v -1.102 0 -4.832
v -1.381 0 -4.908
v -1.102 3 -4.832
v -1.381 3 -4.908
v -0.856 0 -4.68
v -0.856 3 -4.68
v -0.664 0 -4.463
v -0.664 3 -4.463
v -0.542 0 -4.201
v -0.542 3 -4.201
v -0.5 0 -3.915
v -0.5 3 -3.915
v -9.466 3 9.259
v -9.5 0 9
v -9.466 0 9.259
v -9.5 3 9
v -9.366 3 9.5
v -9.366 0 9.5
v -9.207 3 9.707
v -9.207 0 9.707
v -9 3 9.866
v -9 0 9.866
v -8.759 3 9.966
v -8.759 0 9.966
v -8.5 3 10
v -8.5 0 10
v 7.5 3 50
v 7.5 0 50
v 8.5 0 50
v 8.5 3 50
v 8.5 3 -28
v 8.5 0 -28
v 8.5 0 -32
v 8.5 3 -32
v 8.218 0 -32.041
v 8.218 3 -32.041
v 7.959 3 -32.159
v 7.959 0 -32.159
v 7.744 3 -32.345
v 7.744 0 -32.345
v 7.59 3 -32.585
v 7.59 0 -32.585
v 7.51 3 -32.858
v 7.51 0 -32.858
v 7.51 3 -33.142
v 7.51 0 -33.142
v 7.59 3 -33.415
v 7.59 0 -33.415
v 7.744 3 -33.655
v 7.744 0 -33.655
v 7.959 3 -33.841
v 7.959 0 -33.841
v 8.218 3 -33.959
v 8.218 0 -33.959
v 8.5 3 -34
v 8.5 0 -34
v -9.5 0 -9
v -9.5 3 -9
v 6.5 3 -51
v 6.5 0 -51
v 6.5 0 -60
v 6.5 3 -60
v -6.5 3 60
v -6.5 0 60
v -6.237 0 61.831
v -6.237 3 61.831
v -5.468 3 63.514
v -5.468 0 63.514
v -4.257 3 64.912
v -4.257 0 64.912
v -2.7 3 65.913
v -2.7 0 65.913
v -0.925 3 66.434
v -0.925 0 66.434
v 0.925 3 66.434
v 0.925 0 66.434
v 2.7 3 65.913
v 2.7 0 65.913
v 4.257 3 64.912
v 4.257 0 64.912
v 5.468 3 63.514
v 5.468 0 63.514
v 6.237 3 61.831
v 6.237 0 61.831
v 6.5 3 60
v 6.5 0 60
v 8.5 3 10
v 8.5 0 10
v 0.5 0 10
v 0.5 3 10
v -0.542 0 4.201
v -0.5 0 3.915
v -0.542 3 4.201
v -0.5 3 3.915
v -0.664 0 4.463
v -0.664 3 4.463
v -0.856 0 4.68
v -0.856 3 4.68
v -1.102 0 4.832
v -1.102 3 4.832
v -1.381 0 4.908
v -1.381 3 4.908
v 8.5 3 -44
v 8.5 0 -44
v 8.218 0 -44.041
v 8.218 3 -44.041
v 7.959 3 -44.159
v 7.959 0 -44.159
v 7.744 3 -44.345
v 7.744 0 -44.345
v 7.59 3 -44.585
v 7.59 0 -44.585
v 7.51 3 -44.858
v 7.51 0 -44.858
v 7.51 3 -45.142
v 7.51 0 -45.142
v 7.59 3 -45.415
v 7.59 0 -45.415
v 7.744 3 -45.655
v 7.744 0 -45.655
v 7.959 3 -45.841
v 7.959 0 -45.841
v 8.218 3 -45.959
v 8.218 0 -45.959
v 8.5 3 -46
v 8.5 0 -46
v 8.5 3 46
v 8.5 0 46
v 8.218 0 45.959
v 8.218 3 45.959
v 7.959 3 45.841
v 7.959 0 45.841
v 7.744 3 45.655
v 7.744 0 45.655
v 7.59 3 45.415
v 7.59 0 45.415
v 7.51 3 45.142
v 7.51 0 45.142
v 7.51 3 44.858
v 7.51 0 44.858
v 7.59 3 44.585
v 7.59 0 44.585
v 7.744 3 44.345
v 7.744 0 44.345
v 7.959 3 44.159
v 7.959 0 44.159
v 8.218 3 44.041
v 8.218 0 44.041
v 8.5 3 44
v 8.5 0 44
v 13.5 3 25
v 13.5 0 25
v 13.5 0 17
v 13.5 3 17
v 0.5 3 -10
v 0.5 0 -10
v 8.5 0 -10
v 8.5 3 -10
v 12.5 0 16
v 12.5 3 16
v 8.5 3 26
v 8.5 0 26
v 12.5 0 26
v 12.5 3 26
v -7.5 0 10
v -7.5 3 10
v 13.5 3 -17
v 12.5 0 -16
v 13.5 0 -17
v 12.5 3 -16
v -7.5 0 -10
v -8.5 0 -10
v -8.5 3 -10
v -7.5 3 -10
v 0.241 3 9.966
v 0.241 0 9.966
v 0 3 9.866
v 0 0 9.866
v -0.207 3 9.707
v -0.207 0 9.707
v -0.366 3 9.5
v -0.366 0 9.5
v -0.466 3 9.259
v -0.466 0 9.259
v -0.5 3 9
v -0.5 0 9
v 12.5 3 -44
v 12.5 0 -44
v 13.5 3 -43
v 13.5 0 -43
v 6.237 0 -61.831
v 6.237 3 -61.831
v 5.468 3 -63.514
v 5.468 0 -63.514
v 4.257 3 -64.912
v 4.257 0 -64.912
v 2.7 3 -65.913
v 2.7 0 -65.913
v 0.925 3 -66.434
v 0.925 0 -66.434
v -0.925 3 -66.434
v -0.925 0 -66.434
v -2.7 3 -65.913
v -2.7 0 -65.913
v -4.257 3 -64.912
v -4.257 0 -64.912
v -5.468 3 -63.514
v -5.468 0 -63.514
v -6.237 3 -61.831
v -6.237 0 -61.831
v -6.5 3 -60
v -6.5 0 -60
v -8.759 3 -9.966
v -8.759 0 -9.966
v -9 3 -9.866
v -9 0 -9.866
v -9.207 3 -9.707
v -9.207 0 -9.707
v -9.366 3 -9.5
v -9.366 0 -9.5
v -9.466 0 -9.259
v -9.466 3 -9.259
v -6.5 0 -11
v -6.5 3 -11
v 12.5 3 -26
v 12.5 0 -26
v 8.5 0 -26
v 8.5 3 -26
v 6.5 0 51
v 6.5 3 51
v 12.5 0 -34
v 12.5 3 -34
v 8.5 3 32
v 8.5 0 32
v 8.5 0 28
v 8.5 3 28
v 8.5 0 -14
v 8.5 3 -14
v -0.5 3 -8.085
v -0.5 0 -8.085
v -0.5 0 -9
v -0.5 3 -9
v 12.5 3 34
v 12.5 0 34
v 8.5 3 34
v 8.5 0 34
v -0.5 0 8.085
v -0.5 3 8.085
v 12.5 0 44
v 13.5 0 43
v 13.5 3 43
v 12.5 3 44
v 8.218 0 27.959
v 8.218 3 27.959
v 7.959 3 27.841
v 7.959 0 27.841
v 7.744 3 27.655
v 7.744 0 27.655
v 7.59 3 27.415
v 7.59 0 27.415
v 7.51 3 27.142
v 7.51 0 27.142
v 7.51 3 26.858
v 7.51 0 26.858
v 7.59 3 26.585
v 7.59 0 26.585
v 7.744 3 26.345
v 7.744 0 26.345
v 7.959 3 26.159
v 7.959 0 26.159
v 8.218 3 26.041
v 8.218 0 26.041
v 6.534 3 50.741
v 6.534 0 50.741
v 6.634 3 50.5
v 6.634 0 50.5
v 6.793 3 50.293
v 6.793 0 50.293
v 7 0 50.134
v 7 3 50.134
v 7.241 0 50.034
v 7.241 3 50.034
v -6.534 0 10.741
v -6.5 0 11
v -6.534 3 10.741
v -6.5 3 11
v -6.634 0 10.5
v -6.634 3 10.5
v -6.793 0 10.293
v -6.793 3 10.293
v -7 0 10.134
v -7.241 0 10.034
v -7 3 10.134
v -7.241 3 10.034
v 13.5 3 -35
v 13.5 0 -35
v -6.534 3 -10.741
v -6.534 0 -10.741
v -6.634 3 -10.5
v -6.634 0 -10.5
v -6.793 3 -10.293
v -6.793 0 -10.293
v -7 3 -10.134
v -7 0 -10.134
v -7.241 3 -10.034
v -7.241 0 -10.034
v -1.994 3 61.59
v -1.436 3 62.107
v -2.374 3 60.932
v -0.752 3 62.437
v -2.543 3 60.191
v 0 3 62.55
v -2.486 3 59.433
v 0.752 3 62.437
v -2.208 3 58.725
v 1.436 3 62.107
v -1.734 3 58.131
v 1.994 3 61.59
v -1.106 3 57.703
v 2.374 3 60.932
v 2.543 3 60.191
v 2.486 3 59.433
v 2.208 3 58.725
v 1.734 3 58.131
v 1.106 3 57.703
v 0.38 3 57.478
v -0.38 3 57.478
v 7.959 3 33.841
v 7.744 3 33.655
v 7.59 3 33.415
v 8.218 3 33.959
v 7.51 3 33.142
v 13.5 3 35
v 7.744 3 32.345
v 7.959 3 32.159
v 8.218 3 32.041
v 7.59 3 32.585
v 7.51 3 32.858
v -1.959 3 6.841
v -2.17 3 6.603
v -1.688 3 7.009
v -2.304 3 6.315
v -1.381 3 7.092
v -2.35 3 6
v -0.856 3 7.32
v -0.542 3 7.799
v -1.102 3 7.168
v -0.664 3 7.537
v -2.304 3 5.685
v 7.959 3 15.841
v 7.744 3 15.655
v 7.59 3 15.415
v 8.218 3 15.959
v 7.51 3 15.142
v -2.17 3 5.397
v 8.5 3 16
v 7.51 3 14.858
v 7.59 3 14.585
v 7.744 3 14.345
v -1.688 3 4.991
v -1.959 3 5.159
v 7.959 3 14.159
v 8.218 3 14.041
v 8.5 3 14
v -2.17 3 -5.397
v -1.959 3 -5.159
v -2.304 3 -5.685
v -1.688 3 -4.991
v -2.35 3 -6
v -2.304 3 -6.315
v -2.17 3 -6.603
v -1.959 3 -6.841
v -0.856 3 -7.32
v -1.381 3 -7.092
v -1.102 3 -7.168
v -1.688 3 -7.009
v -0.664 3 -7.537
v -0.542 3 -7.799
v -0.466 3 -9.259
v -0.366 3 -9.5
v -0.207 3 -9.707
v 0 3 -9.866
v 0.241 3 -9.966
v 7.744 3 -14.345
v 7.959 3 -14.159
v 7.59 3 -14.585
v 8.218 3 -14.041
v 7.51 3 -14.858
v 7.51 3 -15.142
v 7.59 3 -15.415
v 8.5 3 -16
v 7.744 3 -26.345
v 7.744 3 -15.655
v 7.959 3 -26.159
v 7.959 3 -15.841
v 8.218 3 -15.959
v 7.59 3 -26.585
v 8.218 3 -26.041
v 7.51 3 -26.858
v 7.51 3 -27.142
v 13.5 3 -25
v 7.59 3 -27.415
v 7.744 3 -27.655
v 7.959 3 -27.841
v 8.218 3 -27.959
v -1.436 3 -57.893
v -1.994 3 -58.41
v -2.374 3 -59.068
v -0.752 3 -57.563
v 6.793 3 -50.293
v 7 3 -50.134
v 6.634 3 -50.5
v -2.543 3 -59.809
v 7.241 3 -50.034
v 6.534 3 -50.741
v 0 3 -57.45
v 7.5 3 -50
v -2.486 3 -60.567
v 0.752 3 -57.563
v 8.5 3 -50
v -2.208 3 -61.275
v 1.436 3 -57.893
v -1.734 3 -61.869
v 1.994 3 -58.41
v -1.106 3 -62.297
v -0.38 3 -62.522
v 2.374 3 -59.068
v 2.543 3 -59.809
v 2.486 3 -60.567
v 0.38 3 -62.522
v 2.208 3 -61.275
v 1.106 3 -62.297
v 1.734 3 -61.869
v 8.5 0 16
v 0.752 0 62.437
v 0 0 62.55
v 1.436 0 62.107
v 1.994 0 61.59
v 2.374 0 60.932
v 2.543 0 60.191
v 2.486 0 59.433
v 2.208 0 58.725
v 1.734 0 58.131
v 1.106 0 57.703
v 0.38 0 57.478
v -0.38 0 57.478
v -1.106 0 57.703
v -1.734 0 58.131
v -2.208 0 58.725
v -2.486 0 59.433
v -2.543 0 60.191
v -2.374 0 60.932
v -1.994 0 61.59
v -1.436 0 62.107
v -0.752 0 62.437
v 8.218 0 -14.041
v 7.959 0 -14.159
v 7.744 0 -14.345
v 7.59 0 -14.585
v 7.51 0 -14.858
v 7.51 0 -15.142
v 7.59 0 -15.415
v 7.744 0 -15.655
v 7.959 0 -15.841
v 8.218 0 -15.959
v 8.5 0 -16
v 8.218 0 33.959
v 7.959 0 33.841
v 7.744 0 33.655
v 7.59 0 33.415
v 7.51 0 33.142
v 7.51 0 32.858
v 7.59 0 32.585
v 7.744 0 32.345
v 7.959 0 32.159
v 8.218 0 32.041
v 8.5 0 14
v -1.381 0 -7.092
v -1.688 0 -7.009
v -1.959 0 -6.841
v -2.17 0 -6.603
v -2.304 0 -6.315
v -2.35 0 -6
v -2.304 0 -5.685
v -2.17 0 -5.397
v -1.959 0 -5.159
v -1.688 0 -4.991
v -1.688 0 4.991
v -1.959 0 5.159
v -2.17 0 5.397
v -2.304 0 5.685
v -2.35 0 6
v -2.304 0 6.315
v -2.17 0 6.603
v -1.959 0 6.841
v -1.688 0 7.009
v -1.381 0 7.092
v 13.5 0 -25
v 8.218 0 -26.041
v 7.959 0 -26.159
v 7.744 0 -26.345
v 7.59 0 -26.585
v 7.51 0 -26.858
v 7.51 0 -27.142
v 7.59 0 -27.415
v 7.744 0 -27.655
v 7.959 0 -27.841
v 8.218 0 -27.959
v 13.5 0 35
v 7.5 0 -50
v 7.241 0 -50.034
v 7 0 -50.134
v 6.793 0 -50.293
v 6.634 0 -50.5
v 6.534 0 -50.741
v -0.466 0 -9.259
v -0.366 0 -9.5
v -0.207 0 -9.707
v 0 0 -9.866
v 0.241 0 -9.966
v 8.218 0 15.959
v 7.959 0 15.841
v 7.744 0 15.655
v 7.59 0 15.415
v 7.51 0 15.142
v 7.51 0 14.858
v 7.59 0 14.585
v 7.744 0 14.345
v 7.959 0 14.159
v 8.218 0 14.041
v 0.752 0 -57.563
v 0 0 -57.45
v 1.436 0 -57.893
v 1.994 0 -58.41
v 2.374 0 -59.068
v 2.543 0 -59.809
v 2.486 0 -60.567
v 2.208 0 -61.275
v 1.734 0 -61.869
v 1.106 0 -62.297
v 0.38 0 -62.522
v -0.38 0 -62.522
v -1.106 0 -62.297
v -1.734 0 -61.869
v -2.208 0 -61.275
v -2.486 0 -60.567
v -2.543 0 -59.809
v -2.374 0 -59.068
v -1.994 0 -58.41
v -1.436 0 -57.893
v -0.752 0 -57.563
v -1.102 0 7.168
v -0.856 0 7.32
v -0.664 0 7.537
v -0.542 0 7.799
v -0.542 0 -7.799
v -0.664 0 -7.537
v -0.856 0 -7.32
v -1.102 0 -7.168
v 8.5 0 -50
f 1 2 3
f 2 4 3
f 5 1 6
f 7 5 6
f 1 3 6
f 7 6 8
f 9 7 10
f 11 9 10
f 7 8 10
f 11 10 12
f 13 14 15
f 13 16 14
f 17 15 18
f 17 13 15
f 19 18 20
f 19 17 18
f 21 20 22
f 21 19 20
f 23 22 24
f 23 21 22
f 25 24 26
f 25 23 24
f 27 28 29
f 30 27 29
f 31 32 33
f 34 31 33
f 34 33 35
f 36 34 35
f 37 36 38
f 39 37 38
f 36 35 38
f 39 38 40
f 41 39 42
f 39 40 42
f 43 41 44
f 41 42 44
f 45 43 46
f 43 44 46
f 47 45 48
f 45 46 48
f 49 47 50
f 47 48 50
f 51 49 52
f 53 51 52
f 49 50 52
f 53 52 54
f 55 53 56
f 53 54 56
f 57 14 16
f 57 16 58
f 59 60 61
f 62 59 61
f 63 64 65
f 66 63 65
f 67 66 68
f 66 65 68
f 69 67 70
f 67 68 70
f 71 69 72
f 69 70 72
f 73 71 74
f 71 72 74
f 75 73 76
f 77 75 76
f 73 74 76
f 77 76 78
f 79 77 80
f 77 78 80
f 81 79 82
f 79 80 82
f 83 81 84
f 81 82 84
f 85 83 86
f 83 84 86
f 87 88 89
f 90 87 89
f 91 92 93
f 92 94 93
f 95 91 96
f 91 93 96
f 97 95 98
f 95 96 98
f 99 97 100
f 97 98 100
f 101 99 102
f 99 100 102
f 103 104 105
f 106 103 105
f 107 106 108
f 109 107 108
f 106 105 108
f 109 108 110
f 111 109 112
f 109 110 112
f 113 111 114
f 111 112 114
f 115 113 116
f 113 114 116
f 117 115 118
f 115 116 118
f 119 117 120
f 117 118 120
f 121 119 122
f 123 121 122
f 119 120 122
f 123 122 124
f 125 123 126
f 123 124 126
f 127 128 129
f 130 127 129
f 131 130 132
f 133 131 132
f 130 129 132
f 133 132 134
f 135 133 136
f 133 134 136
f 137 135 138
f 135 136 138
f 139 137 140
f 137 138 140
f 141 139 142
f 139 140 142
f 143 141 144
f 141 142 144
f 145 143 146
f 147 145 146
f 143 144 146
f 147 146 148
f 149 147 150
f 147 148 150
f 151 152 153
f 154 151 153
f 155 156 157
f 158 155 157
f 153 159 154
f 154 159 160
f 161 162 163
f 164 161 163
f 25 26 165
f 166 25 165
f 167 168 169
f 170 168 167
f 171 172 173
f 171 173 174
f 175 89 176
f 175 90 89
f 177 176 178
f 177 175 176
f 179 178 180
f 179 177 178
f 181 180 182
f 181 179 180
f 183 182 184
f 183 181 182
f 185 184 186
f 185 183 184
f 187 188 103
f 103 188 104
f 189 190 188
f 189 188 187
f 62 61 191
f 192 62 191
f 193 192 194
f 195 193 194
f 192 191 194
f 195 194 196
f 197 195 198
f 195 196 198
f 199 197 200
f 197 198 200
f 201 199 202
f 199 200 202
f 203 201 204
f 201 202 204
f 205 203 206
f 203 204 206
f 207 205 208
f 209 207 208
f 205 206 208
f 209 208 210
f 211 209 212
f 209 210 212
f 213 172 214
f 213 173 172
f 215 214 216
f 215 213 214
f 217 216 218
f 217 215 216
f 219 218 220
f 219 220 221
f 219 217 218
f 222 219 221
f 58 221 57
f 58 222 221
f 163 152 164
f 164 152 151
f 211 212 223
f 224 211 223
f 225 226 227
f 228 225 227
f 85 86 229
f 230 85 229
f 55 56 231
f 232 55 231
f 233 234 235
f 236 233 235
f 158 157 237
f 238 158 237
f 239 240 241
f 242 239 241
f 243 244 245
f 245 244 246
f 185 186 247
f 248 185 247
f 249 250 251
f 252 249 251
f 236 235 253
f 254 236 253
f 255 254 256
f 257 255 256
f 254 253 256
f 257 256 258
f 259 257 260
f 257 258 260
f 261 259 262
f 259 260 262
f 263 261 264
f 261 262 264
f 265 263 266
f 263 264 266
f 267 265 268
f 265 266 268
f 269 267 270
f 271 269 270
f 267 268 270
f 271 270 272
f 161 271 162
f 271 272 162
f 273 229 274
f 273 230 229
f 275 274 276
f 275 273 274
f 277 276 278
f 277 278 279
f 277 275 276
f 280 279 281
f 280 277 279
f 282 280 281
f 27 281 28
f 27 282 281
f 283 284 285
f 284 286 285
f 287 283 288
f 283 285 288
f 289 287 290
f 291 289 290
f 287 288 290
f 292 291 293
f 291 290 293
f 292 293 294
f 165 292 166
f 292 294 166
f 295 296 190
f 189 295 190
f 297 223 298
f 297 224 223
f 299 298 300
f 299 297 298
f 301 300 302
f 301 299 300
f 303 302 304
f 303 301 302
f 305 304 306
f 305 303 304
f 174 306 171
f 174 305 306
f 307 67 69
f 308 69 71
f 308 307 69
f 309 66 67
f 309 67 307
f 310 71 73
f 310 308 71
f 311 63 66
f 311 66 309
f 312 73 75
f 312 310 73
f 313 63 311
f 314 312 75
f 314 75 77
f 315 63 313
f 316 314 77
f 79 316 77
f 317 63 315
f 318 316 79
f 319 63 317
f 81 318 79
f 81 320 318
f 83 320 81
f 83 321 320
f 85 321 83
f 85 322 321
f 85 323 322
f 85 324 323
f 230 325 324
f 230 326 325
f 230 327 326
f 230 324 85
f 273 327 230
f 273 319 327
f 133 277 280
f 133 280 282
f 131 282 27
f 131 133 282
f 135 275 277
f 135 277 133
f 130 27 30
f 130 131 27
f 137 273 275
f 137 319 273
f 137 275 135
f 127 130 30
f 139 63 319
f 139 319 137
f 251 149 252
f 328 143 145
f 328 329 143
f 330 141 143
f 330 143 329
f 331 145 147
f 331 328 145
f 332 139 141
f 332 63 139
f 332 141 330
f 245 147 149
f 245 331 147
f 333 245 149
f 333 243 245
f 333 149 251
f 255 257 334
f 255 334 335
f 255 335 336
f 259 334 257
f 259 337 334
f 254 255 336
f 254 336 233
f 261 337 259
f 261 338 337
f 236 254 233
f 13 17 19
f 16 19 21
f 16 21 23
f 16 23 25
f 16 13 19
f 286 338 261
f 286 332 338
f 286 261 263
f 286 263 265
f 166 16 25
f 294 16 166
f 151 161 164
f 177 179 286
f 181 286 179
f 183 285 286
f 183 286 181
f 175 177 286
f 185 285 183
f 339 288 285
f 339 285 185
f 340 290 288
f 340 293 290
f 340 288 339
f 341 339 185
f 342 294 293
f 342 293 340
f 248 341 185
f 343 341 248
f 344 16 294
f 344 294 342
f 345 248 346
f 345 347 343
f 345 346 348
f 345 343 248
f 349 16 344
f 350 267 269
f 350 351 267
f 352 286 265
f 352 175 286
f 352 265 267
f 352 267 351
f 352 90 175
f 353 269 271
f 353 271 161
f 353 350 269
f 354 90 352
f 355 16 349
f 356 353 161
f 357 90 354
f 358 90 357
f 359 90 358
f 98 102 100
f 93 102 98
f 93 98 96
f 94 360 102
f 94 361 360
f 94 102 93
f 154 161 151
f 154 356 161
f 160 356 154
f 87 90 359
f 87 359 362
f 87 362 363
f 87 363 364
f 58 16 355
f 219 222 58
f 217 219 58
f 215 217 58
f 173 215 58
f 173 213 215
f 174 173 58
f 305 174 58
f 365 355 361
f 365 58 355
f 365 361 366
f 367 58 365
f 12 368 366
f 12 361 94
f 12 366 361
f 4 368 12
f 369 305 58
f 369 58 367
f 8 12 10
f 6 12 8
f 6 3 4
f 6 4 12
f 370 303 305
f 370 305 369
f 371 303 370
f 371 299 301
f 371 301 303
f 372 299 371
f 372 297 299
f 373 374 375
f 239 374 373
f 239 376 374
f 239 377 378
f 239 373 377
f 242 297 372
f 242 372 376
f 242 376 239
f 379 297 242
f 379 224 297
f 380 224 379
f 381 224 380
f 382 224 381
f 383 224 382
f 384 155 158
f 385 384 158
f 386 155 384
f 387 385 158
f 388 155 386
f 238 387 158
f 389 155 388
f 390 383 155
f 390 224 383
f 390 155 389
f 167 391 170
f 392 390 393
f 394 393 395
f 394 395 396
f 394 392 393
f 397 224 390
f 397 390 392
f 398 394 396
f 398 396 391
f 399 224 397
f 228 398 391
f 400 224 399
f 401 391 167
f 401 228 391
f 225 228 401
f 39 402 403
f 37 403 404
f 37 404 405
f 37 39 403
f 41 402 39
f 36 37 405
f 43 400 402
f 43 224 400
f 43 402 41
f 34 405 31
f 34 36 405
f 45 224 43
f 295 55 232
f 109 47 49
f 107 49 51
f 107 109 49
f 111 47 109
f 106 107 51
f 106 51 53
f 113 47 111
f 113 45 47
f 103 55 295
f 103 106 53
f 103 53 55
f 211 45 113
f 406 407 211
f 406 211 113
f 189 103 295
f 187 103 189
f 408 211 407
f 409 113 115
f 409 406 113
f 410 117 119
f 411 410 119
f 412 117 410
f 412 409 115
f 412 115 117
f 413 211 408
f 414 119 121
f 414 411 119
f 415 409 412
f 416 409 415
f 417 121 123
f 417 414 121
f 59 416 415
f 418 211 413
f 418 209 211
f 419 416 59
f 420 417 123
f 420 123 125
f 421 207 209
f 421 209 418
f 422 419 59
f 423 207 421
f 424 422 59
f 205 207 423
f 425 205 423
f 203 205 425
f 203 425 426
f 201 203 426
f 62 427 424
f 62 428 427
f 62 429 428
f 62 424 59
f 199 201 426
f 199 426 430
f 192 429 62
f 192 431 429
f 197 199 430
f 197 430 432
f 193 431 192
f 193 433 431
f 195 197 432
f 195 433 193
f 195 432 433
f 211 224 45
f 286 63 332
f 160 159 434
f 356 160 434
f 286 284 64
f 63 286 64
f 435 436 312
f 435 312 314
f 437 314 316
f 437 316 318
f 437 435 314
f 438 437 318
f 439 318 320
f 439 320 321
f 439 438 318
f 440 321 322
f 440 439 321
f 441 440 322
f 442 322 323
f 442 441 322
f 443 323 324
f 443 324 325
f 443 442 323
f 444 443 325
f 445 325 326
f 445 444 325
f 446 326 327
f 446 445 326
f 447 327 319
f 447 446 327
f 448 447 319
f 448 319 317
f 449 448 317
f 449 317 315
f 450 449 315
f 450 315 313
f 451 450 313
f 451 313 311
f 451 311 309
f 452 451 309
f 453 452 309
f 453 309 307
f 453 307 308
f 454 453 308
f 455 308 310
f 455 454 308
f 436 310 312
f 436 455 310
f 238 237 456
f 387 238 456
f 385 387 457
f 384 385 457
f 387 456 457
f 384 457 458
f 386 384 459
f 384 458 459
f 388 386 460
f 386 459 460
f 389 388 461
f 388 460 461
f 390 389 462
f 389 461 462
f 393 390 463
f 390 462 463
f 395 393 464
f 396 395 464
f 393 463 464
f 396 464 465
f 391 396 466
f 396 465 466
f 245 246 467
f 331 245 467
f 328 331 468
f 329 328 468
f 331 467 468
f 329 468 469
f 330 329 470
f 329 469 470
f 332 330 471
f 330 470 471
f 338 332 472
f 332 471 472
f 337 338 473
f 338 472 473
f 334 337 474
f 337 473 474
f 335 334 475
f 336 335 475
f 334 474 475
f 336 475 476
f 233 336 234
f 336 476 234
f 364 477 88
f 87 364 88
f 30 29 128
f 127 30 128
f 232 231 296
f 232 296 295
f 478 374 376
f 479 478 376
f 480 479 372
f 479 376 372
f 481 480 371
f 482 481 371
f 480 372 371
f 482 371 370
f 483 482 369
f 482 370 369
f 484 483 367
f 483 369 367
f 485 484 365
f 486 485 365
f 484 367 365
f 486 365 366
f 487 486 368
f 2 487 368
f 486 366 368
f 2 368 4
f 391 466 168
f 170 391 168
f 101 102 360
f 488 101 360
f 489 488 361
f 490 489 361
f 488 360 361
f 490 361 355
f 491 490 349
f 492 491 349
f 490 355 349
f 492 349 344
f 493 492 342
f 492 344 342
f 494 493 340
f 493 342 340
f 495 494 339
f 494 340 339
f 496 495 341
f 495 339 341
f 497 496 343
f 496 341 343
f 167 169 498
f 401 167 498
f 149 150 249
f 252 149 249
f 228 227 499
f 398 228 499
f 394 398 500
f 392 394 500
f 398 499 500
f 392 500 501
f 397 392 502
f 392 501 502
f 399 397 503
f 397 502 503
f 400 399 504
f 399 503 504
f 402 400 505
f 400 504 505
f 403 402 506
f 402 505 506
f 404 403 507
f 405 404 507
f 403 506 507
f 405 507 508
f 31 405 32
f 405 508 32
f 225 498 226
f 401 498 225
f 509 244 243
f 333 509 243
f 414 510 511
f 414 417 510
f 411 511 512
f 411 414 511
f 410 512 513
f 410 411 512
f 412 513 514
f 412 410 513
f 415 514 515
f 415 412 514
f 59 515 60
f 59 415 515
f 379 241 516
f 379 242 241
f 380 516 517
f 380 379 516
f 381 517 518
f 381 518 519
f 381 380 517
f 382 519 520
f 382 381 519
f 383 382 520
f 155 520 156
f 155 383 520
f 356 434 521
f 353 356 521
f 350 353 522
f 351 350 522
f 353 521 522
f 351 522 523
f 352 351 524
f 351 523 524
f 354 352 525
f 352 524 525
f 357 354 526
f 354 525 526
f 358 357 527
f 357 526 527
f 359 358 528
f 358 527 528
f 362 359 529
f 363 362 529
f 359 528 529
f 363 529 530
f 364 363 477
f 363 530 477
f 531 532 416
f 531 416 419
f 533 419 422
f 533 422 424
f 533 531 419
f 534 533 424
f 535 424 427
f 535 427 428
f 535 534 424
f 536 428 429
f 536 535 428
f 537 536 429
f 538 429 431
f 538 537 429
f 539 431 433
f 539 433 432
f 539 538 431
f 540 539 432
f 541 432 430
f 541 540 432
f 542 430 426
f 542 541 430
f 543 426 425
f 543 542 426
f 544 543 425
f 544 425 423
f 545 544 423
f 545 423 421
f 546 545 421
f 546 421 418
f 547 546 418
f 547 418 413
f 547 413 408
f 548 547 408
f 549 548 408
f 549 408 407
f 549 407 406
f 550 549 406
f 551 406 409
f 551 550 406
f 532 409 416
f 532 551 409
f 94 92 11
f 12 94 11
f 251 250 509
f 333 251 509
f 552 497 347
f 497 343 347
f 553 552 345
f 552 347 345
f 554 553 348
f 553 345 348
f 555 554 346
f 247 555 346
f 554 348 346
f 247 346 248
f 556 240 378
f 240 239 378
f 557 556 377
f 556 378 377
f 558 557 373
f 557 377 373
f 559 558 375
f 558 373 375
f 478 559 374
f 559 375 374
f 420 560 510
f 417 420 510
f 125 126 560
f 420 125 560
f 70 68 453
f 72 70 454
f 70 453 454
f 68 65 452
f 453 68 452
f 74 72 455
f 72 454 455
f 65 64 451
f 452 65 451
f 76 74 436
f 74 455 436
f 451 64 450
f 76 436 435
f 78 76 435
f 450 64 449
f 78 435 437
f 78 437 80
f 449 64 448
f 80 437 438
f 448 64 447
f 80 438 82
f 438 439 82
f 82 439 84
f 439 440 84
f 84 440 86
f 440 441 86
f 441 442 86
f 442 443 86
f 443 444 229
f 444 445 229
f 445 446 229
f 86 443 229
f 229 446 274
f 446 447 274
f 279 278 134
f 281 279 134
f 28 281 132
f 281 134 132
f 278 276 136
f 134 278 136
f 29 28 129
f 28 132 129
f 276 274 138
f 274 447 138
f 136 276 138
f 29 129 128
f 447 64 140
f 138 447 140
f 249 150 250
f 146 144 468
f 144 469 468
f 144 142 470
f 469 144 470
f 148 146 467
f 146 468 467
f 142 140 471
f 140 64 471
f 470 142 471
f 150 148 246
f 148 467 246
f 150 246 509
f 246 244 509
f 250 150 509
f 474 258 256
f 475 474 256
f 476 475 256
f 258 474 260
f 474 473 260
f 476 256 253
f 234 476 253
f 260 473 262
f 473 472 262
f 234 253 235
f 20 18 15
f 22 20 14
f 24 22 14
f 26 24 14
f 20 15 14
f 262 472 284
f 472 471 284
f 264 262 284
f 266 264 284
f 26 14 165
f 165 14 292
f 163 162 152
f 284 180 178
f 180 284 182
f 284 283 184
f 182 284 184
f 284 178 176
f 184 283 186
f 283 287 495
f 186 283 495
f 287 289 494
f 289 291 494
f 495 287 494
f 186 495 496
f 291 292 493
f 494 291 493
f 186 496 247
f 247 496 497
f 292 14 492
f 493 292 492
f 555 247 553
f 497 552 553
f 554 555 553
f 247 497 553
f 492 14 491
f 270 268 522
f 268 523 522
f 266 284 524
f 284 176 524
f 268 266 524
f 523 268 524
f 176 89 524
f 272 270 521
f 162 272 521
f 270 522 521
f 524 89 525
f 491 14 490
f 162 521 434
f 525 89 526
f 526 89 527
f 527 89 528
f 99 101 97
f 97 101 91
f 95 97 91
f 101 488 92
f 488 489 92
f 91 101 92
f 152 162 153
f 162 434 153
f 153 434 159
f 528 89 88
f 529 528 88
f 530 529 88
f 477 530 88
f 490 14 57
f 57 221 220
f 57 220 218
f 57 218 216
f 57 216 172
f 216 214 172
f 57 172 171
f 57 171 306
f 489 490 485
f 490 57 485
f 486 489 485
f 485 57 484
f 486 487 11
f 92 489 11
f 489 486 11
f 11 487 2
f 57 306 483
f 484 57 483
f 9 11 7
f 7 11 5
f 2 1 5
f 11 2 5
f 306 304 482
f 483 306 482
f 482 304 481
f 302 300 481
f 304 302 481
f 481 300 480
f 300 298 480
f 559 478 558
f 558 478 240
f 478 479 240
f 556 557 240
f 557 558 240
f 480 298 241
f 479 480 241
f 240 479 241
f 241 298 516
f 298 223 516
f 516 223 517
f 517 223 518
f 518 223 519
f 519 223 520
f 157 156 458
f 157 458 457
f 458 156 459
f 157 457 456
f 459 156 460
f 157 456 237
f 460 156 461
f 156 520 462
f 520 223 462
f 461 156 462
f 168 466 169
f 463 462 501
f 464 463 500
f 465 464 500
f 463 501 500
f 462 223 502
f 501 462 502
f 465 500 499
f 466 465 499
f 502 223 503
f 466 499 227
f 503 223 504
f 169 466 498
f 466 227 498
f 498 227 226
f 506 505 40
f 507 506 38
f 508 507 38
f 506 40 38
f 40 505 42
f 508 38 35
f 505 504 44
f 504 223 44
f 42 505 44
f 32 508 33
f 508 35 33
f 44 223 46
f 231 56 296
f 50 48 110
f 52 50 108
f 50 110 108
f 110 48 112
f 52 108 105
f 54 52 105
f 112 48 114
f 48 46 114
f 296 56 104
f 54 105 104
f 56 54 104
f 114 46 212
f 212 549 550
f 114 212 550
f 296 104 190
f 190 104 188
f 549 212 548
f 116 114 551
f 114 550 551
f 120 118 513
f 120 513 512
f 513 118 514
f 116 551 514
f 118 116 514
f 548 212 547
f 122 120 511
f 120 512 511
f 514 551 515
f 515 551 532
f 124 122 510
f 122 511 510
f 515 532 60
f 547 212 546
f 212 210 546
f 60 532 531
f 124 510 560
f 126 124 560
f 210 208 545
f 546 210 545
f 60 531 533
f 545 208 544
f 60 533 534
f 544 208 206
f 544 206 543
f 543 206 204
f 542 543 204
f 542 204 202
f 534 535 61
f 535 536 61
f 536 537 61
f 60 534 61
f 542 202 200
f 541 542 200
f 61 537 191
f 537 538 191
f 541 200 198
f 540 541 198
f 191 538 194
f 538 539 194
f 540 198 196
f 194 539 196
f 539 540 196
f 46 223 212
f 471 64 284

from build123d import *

# Parameters (mm, degrees)
SKETCH_1_R          = 6.5
SKETCH_1_R_2        = 2.55
SKETCH_1_W          = 3
SKETCH_1_H          = 20
EXTRUDE_1_DEPTH     = 3
FILLET_1_R          = 1
CHAMFER_1_SIZE      = 1
SKETCH_2_R          = 1.1
CUT_EXTRUDE_1_DEPTH = 68.922750239
FILLET_2_R          = 1


with BuildPart() as part:
    # 草图1 → 凸台-拉伸1 (new body)
    # profile 1 of 4: a face of its own
    with BuildSketch(Plane(origin=(0, 0, 0), x_dir=(1, 0, 0), z_dir=(0, 1, 0))):
        with BuildLine():
            ThreePointArc((6.5, 60), (0, 53.5), (-6.5, 60))
            Line((-6.5, 60), (-6.5, 10))
            Line((-6.5, 10), (-6.5, -10))
            Line((-6.5, -10), (-6.5, -60))
            ThreePointArc((-6.5, -60), (0, -53.5), (6.5, -60))
            Line((6.5, -60), (6.5, -50))
            Line((6.5, -50), (8.5, -50))
            Line((8.5, -50), (8.5, -46))
            ThreePointArc((8.5, -46), (7.5, -45), (8.5, -44))
            Line((8.5, -44), (13.5, -44))
            Line((13.5, -44), (13.5, -34))
            Line((13.5, -34), (8.5, -34))
            ThreePointArc((8.5, -34), (7.5, -33), (8.5, -32))
            Line((8.5, -32), (8.5, -28))
            ThreePointArc((8.5, -28), (7.5, -27), (8.5, -26))
            Line((8.5, -26), (13.5, -26))
            Line((13.5, -26), (13.5, -16))
            Line((13.5, -16), (8.5, -16))
            ThreePointArc((8.5, -16), (7.5, -15), (8.5, -14))
            Line((8.5, -14), (8.5, -10))
            Line((8.5, -10), (-0.5, -10))
            Line((-0.5, -10), (-0.5, 10))
            Line((-0.5, 10), (8.5, 10))
            Line((8.5, 10), (8.5, 14))
            ThreePointArc((8.5, 14), (7.5, 15), (8.5, 16))
            Line((8.5, 16), (13.5, 16))
            Line((13.5, 16), (13.5, 26))
            Line((13.5, 26), (8.5, 26))
            ThreePointArc((8.5, 26), (7.5, 27), (8.5, 28))
            Line((8.5, 28), (8.5, 32))
            ThreePointArc((8.5, 32), (7.5, 33), (8.5, 34))
            Line((8.5, 34), (13.5, 34))
            Line((13.5, 34), (13.5, 44))
            Line((13.5, 44), (8.5, 44))
            ThreePointArc((8.5, 44), (7.5, 45), (8.5, 46))
            Line((8.5, 46), (8.5, 50))
            Line((8.5, 50), (6.5, 50))
            Line((6.5, 50), (6.5, 60))
        make_face()
    # profile 2 of 4: a face of its own
    with BuildSketch(Plane(origin=(0, 0, 0), x_dir=(1, 0, 0), z_dir=(0, 1, 0))):
        with Locations((0, -60)):
            Circle(SKETCH_1_R)
        with Locations(Location((0, -60, 0), (0, 0, 270))):
            Circle(SKETCH_1_R_2, mode=Mode.SUBTRACT)
    # profile 3 of 4: a face of its own
    with BuildSketch(Plane(origin=(0, 0, 0), x_dir=(1, 0, 0), z_dir=(0, 1, 0))):
        with Locations((0, 60)):
            Circle(SKETCH_1_R)
        with Locations(Location((0, 60, 0), (0, 0, 270))):
            Circle(SKETCH_1_R_2, mode=Mode.SUBTRACT)
    # profile 4 of 4: a face of its own
    with BuildSketch(Plane(origin=(0, 0, 0), x_dir=(1, 0, 0), z_dir=(0, 1, 0))):
        with Locations((-8, 0)):
            Rectangle(SKETCH_1_W, SKETCH_1_H)
    extrude(amount=EXTRUDE_1_DEPTH)

    # 圆角1
    fillet_1_edges = [part.edges().sort_by_distance(p)[0] for p in [
        (6.5, 1.5, 50),
        (-6.5, 1.5, 10),
        (-9.5, 1.5, 10),
        (-9.5, 1.5, -10),
        (-6.5, 1.5, -10),
        (6.5, 1.5, -50),
        (-0.5, 1.5, -10),
        (-0.5, 1.5, 10),
    ]]
    fillet(fillet_1_edges, radius=FILLET_1_R)

    # 倒角1
    chamfer_1_edges = [part.edges().sort_by_distance(p)[0] for p in [
        (13.5, 1.5, 16),
        (13.5, 1.5, 26),
        (13.5, 1.5, 34),
        (13.5, 1.5, 44),
        (13.5, 1.5, -44),
        (13.5, 1.5, -34),
        (13.5, 1.5, -26),
        (13.5, 1.5, -16),
    ]]
    chamfer(chamfer_1_edges, length=CHAMFER_1_SIZE)

    # 草图2 → 切除-拉伸1 (cut, through all)
    with BuildSketch(Plane(origin=(0, 3, 0), x_dir=(1, 0, 0), z_dir=(0, 1, 0))):
        with Locations((6.75, 6)):
            Circle(SKETCH_2_R)
        with Locations((-1.25, 6)):
            Circle(SKETCH_2_R)
        with Locations((6.75, -6)):
            Circle(SKETCH_2_R)
        with Locations((-1.25, -6)):
            Circle(SKETCH_2_R)
    extrude(amount=-CUT_EXTRUDE_1_DEPTH, mode=Mode.SUBTRACT)

    # 圆角2
    fillet_2_edges = [part.edges().sort_by_distance(p)[0] for p in [
        (-0.5, 1.5, -6.804673847),
        (-0.5, 1.5, -5.195326153),
        (-0.5, 1.5, 5.195326153),
        (-0.5, 1.5, 6.804673847),
    ]]
    fillet(fillet_2_edges, radius=FILLET_2_R)


solid = part.part
